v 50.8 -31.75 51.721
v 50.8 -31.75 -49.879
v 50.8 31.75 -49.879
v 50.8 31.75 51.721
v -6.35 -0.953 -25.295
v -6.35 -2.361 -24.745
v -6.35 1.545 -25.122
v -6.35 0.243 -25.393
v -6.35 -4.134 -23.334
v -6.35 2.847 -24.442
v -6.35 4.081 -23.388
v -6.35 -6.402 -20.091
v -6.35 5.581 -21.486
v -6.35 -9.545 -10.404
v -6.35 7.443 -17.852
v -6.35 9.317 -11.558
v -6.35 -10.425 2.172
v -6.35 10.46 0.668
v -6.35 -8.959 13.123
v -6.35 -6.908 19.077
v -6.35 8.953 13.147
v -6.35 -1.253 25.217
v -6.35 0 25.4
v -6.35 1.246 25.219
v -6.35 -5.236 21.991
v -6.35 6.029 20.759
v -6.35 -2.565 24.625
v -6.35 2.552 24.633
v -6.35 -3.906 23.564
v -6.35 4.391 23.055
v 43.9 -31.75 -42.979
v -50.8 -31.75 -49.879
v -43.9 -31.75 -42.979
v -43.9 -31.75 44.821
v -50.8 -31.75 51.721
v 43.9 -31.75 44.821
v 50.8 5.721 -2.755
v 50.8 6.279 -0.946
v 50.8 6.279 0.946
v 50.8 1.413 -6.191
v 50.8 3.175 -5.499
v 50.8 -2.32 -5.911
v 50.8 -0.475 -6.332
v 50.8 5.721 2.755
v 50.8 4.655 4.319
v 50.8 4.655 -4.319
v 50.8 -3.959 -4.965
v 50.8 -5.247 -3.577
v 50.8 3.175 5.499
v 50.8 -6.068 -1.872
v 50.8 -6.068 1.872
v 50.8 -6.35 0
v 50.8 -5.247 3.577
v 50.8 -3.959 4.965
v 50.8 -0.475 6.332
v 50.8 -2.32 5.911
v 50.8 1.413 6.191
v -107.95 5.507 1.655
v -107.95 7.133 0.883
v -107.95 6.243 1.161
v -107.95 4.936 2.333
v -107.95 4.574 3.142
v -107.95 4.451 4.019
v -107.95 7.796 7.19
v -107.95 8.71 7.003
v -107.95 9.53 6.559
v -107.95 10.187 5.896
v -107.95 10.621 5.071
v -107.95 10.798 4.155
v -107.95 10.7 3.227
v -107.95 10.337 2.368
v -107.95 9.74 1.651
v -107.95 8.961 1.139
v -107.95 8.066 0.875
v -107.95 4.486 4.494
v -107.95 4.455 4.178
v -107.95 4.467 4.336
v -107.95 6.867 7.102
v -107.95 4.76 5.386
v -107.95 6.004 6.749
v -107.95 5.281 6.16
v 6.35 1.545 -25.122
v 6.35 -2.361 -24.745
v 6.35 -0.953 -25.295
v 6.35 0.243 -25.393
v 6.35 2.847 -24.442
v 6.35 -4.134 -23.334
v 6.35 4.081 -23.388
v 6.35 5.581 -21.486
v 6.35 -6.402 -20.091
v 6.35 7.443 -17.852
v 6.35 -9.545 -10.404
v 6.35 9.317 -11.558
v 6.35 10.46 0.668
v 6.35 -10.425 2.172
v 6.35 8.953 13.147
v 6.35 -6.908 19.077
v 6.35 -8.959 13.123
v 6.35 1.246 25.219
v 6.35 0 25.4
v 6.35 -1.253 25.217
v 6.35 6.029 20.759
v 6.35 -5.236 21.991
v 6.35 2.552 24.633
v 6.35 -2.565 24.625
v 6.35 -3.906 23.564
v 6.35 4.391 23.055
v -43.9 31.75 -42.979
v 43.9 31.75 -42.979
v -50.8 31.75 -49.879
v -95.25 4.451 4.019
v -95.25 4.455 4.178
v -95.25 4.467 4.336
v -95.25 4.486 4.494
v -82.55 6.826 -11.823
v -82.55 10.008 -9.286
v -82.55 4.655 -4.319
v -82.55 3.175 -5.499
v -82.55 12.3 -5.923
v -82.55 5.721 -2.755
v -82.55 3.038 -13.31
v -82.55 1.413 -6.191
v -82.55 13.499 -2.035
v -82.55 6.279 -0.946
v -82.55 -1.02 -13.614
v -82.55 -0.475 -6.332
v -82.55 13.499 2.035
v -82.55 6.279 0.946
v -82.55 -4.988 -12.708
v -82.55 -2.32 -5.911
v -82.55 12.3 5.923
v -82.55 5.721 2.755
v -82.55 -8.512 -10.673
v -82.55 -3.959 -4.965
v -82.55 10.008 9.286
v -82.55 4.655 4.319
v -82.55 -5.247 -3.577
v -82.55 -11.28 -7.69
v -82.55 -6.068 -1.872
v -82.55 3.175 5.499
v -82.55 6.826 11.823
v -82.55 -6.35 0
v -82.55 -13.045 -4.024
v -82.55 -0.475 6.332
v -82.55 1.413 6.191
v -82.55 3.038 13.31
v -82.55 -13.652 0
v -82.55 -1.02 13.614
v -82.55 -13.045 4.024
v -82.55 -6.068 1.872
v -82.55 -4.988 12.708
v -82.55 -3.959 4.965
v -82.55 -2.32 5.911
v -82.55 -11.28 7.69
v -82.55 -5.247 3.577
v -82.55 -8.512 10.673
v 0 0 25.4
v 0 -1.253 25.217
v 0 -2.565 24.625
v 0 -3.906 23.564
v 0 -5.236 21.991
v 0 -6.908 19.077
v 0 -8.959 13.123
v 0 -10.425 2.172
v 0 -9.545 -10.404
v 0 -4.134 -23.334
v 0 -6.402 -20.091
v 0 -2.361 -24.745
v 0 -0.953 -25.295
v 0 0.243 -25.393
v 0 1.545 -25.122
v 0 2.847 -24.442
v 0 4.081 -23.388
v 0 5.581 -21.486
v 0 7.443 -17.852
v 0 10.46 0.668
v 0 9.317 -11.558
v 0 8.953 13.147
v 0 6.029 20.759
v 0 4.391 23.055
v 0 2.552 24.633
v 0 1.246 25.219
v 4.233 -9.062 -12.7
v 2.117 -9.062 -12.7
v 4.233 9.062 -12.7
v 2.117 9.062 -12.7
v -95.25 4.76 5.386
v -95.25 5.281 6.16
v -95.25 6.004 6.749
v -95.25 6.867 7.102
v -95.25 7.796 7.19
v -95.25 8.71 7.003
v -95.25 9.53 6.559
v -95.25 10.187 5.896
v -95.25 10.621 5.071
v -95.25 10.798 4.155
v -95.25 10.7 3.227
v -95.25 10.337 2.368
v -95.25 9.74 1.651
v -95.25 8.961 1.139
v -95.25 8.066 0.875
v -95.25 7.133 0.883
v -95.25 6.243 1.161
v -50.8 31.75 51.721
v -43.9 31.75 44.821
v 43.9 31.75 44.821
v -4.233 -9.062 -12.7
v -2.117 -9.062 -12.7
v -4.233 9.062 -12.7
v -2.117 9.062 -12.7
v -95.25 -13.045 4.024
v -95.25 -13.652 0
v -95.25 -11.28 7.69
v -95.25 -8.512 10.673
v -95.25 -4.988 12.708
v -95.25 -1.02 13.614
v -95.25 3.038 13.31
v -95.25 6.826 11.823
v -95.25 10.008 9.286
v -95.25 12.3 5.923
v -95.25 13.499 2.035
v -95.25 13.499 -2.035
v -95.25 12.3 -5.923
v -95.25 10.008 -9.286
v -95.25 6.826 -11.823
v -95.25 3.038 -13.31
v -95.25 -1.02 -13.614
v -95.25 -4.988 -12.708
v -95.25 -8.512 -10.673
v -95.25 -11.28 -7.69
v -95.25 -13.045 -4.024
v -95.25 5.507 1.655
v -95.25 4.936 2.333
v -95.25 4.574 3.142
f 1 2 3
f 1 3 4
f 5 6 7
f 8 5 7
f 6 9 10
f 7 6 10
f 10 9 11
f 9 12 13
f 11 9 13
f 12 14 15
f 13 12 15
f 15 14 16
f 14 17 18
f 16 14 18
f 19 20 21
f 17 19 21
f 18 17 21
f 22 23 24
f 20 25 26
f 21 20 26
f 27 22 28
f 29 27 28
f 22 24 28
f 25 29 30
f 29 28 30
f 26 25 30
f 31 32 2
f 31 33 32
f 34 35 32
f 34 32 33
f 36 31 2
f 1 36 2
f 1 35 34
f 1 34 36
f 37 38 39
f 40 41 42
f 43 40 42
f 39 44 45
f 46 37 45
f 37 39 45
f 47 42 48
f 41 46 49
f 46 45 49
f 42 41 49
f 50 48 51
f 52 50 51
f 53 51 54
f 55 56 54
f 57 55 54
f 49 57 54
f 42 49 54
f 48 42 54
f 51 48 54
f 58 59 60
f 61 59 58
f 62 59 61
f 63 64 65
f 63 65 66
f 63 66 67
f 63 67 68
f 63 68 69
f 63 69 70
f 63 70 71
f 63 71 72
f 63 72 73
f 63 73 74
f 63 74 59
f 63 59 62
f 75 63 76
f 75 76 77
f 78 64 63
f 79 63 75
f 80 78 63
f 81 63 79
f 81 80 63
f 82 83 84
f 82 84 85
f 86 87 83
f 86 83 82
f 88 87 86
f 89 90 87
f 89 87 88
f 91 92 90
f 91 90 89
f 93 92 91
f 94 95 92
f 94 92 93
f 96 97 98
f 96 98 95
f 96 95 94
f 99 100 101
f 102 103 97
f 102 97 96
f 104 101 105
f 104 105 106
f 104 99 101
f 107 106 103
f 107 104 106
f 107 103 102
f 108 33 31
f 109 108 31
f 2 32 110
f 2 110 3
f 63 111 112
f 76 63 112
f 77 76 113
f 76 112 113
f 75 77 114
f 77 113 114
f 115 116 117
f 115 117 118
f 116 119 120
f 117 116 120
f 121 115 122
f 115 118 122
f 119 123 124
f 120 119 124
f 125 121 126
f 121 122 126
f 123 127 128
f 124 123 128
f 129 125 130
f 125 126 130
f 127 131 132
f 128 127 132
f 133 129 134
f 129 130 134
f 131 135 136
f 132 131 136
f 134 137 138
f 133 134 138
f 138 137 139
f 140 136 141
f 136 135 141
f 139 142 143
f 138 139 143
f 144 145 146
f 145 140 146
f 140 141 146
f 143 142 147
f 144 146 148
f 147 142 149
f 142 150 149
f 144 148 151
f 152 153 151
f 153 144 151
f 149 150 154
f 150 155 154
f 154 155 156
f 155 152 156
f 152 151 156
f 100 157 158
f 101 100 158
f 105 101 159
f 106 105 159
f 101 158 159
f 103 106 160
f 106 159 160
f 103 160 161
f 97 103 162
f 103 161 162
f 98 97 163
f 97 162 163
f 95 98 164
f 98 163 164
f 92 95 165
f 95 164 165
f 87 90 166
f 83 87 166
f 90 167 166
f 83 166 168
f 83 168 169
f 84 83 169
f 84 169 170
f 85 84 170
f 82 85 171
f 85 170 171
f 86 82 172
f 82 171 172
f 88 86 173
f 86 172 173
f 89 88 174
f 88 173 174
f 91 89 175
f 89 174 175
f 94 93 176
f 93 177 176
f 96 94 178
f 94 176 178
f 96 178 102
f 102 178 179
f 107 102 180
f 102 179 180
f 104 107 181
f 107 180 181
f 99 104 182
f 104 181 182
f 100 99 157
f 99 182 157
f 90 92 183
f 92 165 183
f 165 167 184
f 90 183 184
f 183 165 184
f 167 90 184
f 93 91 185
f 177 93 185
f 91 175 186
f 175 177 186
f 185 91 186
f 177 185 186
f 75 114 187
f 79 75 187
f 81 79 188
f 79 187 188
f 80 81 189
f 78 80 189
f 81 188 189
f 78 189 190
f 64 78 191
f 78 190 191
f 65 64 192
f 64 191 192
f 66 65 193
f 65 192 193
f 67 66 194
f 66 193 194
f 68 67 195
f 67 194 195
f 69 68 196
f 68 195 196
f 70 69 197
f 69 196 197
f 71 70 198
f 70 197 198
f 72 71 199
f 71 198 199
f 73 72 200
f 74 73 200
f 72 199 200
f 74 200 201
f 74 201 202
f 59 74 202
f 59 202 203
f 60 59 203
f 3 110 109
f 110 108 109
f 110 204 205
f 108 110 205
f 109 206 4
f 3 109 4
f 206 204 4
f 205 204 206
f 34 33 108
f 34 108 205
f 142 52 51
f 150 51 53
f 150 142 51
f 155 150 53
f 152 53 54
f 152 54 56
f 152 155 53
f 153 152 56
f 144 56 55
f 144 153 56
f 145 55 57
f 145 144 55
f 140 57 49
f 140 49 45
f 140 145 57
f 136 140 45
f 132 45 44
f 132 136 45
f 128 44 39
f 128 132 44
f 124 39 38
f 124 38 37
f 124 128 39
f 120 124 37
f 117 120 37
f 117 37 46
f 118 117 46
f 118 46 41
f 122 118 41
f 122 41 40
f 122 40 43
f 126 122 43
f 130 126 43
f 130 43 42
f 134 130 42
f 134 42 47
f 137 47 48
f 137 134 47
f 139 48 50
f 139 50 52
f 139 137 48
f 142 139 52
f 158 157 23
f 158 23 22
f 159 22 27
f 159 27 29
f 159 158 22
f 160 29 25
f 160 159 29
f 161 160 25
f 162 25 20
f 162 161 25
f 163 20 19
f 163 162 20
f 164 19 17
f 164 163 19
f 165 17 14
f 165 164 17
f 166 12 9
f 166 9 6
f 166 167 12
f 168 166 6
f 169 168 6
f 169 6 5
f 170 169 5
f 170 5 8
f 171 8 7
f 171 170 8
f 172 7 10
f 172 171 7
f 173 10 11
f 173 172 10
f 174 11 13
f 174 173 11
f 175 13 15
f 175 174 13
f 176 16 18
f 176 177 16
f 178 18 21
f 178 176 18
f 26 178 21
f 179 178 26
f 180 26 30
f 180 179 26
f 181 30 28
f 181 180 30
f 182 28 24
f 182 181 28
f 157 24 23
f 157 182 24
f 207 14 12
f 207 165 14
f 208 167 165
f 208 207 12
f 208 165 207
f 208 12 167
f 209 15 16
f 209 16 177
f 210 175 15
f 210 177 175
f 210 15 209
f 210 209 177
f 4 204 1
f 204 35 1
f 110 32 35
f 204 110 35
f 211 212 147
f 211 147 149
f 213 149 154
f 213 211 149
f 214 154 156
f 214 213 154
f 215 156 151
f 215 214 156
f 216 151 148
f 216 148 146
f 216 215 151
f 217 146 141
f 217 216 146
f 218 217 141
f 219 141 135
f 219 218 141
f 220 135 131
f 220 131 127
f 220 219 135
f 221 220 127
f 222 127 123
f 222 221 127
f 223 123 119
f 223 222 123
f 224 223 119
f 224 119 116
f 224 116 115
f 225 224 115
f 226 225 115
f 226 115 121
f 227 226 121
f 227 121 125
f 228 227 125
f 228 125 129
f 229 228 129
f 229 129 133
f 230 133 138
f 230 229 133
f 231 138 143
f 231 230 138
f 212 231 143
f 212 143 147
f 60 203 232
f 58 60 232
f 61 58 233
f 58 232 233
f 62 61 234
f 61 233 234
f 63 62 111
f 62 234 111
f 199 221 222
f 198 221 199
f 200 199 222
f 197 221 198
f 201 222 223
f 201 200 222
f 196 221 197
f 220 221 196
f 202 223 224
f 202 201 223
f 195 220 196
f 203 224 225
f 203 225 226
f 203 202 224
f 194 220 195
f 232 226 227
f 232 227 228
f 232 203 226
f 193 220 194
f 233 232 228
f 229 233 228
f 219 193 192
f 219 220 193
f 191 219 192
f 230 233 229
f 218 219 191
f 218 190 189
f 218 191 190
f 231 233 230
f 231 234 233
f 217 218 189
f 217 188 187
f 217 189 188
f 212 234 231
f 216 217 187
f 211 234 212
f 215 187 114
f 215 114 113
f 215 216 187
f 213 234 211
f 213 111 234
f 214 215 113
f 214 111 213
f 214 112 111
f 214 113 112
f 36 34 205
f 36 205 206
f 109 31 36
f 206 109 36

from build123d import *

# Parameters (mm, degrees)
F0_W          = 101.6
F0_H          = 101.6
F1_DEPTH      = 31.75
F2_W          = 87.7997364508
F2_H          = 87.7997364508
F3_DEPTH      = 101.6
F4_R          = 6.35
F5_DEPTH      = 44.45
F5_DEPTH_BACK = 101.6
F9_DEPTH      = 6.35
F11_R         = 13.6518424836
F11_R_2       = 6.35
F12_DEPTH     = 12.7
F14_DEPTH     = 12.7


# Not quite as in the source:
# - the program builds the solid bodies; features that only make, move or delete a surface that nothing else refers to are left out


with BuildPart() as f1:
    # F0 (on Front) → F1 (new body, symmetric)
    with BuildSketch(Plane.XZ):
        with Locations((3.7253e-06, 0.921211595)):
            Rectangle(F0_W, F0_H)
    extrude(amount=F1_DEPTH, both=True)

    # F2 (on face) → F3 (cut)
    with BuildSketch(Plane.XZ.offset(31.75)):
        with Locations((3.7253e-06, 0.921211595)):
            Rectangle(F2_W, F2_H)
    extrude(amount=-F3_DEPTH, mode=Mode.SUBTRACT)


with BuildPart() as f5:
    # F4 (on face) → F5 (new body, two sides)
    with BuildSketch(Plane(origin=(-50.7999962747, 0, 0), x_dir=(0, -1, 0), z_dir=(-1, 0, 0))) as f5_sk:
        Circle(F4_R)
    extrude(amount=F5_DEPTH)
    extrude(f5_sk.sketch, amount=-F5_DEPTH_BACK)

    # F11 (on face) → F12 (join)
    with BuildSketch(Plane(origin=(-95.2499962747, 0, 0), x_dir=(0, -1, 0), z_dir=(-1, 0, 0))):
        Circle(F11_R)
        Circle(F11_R_2, mode=Mode.SUBTRACT)
    extrude(amount=-F12_DEPTH)

    # F13 (on face) → F14 (join)
    with BuildSketch(Plane(origin=(-95.2499962747, 0, 0), x_dir=(0, -1, 0), z_dir=(-1, 0, 0))):
        with BuildLine():
            ThreePointArc((-6.2429233087, 1.1612099561), (-5.6174872871, 2.9607999898), (-4.486384138, 4.4938688639))
            ThreePointArc((-4.486384138, 4.4938688639), (-10.434456191, 5.4996720429), (-6.2429233087, 1.1612099561))
        make_face()
        with BuildLine():
            ThreePointArc((-6.2429233087, 1.1612099561), (-4.9358258553, 2.332519374), (-4.4507125475, 4.019272048))
            ThreePointArc((-4.4507125475, 4.019272048), (-4.4596430046, 4.257239798), (-4.486384138, 4.4938688639))
            ThreePointArc((-4.486384138, 4.4938688639), (-5.6174872871, 2.9607999898), (-6.2429233087, 1.1612099561))
        make_face()
    extrude(amount=F14_DEPTH)


with BuildPart() as f9:
    # F8 (on Right) → F9 (new body, symmetric)
    with BuildSketch(Plane.YZ):
        with BuildLine():
            add(Edge.make_bspline(
                [(0, 25.4), (-18.1230958021, 25.4), (-9.0615479011, -12.7), (0, -50.8), (9.0615479011, -12.7), (18.1230958021, 25.4), (0, 25.4)],
                knots=[0, 0, 0, 2.0943951024, 2.0943951024, 4.1887902048, 4.1887902048, 6.2831853072, 6.2831853072, 6.2831853072], degree=2, weights=[1, 0.5, 1, 0.5, 1, 0.5, 1]))
        make_face()
    extrude(amount=F9_DEPTH, both=True)


solid = Compound([f1.part, f5.part, f9.part])
